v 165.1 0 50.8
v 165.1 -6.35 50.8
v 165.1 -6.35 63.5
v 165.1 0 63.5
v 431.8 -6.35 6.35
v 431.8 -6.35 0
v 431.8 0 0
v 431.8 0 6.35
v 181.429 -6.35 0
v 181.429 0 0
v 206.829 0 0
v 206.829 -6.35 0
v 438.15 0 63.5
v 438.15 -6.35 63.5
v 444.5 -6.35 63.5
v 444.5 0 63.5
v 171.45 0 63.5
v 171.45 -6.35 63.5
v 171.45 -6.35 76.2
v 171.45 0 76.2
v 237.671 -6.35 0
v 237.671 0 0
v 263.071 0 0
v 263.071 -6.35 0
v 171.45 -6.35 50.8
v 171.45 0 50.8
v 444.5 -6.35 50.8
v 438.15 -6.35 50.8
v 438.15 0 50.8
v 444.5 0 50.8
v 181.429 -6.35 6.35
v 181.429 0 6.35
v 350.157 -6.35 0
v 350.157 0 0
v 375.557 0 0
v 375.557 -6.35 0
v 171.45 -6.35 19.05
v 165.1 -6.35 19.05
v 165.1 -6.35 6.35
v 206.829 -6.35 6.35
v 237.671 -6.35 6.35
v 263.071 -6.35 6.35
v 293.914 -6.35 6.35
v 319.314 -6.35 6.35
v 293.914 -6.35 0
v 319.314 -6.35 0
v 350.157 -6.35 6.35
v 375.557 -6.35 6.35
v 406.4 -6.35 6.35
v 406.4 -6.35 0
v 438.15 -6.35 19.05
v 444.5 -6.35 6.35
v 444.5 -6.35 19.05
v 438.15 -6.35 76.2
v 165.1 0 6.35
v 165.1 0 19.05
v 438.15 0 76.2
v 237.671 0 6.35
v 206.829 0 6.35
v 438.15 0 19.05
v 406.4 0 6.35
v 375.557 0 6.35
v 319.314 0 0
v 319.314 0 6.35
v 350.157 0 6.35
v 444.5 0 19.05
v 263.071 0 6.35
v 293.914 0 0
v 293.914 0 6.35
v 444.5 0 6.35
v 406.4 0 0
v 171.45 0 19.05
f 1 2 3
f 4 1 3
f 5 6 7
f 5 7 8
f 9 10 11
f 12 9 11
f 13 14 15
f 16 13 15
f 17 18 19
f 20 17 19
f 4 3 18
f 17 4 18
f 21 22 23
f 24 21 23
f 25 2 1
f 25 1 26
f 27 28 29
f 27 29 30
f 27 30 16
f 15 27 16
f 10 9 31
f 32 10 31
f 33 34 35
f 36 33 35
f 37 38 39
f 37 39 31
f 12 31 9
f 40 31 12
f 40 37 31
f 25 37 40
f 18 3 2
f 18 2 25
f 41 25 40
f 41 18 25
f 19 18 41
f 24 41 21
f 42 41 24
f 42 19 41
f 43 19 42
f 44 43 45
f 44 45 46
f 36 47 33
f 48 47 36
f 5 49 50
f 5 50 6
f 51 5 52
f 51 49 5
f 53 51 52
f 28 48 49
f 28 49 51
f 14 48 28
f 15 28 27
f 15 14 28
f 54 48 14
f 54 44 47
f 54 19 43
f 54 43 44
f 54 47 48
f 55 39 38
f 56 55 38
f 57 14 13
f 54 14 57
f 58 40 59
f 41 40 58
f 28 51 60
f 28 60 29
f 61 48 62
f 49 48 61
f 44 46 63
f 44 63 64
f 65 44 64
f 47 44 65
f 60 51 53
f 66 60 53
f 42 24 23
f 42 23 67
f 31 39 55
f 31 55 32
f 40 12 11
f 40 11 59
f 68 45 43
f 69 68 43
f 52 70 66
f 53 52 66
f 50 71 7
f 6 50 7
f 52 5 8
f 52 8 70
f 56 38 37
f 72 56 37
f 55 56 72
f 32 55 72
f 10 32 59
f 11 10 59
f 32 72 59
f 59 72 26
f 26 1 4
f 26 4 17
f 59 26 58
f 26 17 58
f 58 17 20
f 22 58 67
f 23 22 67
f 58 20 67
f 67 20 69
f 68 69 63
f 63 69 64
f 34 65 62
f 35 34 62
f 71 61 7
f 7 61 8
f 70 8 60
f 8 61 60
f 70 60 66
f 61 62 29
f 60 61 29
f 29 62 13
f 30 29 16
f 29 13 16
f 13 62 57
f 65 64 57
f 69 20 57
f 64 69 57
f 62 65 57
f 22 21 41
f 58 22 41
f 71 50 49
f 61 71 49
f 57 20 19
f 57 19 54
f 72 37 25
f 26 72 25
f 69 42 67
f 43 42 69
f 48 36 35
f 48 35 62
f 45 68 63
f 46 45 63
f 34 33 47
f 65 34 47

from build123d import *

# Parameters (mm, degrees)
F0_W     = 444.5
F0_H     = 76.2
F1_DEPTH = 6.35
F2_W     = 6.35
F2_H     = 6.35
F2_H_2   = 12.7
F2_H_3   = 31.75
F3_DEPTH = 6.35
F4_W     = 30.842857
F4_H     = 6.35
F4_W_2   = 30.842858
F4_W_3   = 6.35
F5_DEPTH = 6.351
F6_W     = 165.1
F6_H     = 76.2
F7_DEPTH = 6.351
F8_W     = 6.35
F8_H     = 12.7
F8_H_2   = 31.75
F9_DEPTH = 6.351


with BuildPart() as f1:
    # F0 (on Front) → F1 (new body)
    with BuildSketch(Plane.XZ):
        with Locations((222.25, 38.1)):
            Rectangle(F0_W, F0_H)
    extrude(amount=F1_DEPTH)

    # F2 (on face) → F3 (cut, through all)
    with BuildSketch(Plane.XZ.offset(6.35)):
        with Locations((3.175, 3.175)):
            Rectangle(F2_W, F2_H)
        with Locations((3.175, 69.85)):
            Rectangle(F2_W, F2_H_2)
        with Locations((3.175, 34.925)):
            Rectangle(F2_W, F2_H_3)
        with Locations((441.325, 3.175)):
            Rectangle(F2_W, F2_H)
        with Locations((441.325, 34.925)):
            Rectangle(F2_W, F2_H_3)
        with Locations((441.325, 69.85)):
            Rectangle(F2_W, F2_H_2)
    extrude(amount=-F3_DEPTH, mode=Mode.SUBTRACT)

    # F4 (on face) → F5 (cut, through all)
    with BuildSketch(Plane.XZ.offset(6.35)):
        with Locations((53.521428, 3.175)):
            Rectangle(F4_W, F4_H)
        with Locations((109.764285, 3.175)):
            Rectangle(F4_W, F4_H)
        with Locations((166.007142, 3.175)):
            Rectangle(F4_W, F4_H)
        with Locations((222.25, 3.175)):
            Rectangle(F4_W_2, F4_H)
        with Locations((278.492858, 3.175)):
            Rectangle(F4_W, F4_H)
        with Locations((334.735714, 3.175)):
            Rectangle(F4_W, F4_H)
        with Locations((390.978571, 3.175)):
            Rectangle(F4_W, F4_H)
        with Locations((9.525, 3.175)):
            Rectangle(F4_W_3, F4_H)
        with Locations((434.975, 3.175)):
            Rectangle(F4_W_3, F4_H)
    extrude(amount=-F5_DEPTH, mode=Mode.SUBTRACT)

    # F6 (on face) → F7 (cut, through all)
    with BuildSketch(Plane.XZ.offset(6.35)):
        with Locations((82.55, 38.1)):
            Rectangle(F6_W, F6_H)
    extrude(amount=-F7_DEPTH, mode=Mode.SUBTRACT)

    # F8 (on face) → F9 (cut, through all)
    with BuildSketch(Plane.XZ.offset(6.35)):
        with Locations((168.275, 69.85)):
            Rectangle(F8_W, F8_H)
        with Locations((168.275, 34.925)):
            Rectangle(F8_W, F8_H_2)
    extrude(amount=-F9_DEPTH, mode=Mode.SUBTRACT)


solid = f1.part
